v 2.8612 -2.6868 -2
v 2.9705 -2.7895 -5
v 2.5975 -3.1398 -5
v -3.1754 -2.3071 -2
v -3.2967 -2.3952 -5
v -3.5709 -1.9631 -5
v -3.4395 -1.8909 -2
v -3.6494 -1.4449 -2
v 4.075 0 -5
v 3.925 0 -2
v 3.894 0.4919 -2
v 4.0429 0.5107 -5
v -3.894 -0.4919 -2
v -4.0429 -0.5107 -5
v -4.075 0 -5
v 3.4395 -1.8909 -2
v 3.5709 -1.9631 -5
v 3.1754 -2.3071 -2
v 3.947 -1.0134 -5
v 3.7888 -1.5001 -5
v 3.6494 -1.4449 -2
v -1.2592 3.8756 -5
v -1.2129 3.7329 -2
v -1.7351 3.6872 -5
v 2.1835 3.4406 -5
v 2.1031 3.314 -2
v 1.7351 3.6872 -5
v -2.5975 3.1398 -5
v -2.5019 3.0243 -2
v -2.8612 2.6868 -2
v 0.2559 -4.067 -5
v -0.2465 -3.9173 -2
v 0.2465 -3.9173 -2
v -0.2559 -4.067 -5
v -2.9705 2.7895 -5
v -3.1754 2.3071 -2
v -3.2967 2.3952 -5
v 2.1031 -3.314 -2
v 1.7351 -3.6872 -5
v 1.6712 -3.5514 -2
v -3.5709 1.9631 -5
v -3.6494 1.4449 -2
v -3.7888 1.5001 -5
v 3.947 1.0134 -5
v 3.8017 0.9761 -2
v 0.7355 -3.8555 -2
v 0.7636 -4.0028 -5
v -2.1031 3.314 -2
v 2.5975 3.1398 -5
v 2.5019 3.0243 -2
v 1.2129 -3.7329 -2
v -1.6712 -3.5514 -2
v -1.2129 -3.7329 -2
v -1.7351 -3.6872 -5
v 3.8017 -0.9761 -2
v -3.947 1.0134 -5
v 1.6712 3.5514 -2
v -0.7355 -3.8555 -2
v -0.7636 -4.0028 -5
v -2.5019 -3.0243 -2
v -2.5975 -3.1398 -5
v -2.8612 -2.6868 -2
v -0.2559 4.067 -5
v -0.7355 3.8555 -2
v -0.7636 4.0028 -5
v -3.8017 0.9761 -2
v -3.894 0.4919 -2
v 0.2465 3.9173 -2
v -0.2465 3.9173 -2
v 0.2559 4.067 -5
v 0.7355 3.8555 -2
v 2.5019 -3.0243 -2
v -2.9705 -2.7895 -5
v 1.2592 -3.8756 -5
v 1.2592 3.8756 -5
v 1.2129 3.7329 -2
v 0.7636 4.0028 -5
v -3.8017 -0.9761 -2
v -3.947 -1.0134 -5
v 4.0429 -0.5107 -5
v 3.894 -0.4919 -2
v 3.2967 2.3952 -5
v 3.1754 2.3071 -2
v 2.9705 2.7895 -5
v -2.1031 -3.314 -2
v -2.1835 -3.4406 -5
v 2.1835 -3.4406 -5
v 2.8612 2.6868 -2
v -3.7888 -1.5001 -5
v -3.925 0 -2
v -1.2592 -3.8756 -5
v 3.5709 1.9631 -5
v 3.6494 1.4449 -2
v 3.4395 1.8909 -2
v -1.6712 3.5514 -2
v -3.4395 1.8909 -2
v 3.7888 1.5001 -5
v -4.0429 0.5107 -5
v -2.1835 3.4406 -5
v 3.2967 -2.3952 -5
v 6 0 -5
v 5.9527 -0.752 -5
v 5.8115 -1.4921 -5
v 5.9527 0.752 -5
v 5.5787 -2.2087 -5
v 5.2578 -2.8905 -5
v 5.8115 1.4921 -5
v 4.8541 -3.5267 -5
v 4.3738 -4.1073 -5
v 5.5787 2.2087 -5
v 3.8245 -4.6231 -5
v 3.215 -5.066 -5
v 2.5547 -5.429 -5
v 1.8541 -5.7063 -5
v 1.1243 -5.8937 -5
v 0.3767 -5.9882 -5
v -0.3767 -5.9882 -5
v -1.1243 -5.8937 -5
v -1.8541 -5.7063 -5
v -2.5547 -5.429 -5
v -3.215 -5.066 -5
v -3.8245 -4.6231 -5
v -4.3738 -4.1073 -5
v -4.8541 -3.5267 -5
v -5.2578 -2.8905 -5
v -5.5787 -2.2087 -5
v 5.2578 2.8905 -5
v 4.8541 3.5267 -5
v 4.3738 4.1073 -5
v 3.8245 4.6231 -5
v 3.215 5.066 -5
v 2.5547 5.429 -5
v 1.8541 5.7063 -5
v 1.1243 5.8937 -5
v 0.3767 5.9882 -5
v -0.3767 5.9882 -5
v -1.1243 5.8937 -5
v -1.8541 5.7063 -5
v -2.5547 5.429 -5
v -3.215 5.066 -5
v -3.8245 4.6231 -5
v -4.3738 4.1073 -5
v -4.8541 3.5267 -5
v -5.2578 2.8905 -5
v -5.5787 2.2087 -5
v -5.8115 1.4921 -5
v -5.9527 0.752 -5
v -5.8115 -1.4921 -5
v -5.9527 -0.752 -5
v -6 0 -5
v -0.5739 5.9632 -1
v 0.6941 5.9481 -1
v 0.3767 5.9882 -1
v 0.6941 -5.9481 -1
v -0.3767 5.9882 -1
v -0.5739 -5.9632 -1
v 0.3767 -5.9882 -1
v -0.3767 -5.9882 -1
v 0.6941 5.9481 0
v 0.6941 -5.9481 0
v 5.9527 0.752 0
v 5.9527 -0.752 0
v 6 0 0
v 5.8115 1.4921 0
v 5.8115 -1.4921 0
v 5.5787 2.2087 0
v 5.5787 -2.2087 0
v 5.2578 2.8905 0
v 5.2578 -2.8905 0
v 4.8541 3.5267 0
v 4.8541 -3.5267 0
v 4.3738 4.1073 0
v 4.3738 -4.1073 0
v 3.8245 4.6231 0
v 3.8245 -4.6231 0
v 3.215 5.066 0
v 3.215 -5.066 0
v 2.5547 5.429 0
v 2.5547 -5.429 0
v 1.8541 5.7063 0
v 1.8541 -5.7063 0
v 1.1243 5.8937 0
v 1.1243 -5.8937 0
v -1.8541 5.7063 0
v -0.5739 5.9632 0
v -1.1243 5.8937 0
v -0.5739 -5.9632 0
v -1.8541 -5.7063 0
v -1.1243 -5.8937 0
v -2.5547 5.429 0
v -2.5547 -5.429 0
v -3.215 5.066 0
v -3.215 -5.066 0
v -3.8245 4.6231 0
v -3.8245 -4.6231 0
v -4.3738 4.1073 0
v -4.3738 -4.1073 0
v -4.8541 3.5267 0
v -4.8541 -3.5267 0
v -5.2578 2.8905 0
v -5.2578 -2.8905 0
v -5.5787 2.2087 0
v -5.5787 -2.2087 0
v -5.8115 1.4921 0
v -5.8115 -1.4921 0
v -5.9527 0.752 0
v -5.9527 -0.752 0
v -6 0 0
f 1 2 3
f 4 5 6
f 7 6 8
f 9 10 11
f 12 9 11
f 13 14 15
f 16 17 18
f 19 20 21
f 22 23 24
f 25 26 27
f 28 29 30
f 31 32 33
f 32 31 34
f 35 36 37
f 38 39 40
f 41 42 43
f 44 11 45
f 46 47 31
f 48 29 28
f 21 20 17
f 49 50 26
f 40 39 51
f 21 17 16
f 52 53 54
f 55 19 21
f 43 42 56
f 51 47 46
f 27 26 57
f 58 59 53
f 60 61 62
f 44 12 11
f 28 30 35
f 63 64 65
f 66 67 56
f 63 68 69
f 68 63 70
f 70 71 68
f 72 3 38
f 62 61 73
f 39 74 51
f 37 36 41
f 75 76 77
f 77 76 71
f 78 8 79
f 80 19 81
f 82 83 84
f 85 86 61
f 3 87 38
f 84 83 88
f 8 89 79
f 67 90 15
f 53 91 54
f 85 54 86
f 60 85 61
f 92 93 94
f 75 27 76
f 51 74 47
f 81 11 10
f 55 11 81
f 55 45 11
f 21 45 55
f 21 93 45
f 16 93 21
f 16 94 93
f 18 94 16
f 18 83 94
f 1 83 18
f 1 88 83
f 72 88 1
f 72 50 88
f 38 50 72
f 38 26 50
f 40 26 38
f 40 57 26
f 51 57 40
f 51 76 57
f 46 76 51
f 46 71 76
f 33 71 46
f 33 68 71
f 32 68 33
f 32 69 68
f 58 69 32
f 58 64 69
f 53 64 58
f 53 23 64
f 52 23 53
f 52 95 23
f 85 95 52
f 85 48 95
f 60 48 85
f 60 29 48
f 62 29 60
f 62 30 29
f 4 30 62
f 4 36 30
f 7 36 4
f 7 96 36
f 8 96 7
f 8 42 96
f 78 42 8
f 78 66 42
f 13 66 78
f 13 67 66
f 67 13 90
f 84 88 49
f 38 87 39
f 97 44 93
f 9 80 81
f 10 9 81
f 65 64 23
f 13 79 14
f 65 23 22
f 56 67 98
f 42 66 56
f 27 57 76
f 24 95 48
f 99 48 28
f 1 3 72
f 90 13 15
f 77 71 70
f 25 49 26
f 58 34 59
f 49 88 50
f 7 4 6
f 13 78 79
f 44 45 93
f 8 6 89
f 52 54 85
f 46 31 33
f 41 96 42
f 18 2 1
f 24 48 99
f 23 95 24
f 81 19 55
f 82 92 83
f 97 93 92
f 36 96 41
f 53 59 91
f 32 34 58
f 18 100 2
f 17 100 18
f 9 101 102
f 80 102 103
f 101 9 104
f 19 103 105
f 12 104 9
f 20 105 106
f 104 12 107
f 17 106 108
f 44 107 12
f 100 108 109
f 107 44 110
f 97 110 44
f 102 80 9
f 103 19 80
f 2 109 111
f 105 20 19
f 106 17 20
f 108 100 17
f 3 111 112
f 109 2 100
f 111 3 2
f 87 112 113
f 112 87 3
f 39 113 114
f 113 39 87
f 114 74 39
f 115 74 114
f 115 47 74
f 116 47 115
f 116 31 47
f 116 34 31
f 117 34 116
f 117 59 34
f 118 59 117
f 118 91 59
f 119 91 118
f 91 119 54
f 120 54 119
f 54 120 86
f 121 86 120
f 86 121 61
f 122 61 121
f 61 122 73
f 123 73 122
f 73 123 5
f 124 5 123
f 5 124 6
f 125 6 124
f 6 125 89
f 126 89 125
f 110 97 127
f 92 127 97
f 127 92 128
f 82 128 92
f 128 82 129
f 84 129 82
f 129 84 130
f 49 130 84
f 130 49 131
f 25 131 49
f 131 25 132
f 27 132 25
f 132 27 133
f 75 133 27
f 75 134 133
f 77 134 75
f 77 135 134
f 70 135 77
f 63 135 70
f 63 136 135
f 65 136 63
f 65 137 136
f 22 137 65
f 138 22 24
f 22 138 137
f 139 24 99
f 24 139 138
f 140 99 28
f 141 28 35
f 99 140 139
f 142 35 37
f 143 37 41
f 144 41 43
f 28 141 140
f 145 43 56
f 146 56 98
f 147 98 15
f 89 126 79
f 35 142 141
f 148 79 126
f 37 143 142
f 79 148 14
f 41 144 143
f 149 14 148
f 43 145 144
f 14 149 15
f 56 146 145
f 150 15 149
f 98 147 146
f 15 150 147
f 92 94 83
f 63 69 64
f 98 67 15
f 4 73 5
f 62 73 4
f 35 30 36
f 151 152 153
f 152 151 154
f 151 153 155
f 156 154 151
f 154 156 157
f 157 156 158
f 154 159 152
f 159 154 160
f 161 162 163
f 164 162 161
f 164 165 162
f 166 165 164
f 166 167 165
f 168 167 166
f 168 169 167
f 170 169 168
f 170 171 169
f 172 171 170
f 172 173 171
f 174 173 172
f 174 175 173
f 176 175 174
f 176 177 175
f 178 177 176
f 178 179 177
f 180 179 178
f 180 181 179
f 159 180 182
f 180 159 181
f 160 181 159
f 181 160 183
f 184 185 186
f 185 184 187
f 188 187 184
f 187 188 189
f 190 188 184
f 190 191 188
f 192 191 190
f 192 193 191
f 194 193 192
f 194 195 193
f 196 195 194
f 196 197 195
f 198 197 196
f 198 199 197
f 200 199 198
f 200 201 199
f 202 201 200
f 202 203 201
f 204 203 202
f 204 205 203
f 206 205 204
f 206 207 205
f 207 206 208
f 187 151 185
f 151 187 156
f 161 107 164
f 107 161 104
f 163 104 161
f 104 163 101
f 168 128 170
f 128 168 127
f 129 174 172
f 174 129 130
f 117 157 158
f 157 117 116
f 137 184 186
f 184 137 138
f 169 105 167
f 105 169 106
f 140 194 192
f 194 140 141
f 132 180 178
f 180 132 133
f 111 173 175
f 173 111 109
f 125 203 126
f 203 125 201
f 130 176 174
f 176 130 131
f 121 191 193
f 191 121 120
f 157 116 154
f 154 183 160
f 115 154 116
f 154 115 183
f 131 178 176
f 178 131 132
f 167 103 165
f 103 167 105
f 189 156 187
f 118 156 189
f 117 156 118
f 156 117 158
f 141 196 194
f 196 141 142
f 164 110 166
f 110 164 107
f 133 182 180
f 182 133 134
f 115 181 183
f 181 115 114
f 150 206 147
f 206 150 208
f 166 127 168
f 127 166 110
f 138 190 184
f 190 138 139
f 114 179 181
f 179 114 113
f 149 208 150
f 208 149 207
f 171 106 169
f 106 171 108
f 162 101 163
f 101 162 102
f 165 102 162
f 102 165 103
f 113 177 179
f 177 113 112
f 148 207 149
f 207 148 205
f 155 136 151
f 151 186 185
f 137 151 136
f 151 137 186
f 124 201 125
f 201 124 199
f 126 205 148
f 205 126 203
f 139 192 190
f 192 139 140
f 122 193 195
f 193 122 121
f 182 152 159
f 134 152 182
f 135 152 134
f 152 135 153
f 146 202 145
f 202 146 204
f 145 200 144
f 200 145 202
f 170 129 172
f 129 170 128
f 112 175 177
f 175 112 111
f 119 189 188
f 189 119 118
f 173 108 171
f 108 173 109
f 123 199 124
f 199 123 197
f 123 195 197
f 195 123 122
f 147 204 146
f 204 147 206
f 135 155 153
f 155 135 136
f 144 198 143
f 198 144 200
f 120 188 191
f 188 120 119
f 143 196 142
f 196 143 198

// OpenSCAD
$fn = 50;

difference() {
	union() {
		translate(v = [0, 0, -5.0]) {
			cylinder(h = 5, r = 6.0);
		}
	}
	union() {
		#translate(v = [0, 0, -5.0]) {
			cylinder(h = 3, r1 = 4.075, r2 = 3.925);
		}
		translate(v = [0, 0, -1]) {
			linear_extrude(height = 1) {
				text(font = "Wingdings", halign = "center", size = 11, text = "|", valign = "center");
			}
		}
	}
}
